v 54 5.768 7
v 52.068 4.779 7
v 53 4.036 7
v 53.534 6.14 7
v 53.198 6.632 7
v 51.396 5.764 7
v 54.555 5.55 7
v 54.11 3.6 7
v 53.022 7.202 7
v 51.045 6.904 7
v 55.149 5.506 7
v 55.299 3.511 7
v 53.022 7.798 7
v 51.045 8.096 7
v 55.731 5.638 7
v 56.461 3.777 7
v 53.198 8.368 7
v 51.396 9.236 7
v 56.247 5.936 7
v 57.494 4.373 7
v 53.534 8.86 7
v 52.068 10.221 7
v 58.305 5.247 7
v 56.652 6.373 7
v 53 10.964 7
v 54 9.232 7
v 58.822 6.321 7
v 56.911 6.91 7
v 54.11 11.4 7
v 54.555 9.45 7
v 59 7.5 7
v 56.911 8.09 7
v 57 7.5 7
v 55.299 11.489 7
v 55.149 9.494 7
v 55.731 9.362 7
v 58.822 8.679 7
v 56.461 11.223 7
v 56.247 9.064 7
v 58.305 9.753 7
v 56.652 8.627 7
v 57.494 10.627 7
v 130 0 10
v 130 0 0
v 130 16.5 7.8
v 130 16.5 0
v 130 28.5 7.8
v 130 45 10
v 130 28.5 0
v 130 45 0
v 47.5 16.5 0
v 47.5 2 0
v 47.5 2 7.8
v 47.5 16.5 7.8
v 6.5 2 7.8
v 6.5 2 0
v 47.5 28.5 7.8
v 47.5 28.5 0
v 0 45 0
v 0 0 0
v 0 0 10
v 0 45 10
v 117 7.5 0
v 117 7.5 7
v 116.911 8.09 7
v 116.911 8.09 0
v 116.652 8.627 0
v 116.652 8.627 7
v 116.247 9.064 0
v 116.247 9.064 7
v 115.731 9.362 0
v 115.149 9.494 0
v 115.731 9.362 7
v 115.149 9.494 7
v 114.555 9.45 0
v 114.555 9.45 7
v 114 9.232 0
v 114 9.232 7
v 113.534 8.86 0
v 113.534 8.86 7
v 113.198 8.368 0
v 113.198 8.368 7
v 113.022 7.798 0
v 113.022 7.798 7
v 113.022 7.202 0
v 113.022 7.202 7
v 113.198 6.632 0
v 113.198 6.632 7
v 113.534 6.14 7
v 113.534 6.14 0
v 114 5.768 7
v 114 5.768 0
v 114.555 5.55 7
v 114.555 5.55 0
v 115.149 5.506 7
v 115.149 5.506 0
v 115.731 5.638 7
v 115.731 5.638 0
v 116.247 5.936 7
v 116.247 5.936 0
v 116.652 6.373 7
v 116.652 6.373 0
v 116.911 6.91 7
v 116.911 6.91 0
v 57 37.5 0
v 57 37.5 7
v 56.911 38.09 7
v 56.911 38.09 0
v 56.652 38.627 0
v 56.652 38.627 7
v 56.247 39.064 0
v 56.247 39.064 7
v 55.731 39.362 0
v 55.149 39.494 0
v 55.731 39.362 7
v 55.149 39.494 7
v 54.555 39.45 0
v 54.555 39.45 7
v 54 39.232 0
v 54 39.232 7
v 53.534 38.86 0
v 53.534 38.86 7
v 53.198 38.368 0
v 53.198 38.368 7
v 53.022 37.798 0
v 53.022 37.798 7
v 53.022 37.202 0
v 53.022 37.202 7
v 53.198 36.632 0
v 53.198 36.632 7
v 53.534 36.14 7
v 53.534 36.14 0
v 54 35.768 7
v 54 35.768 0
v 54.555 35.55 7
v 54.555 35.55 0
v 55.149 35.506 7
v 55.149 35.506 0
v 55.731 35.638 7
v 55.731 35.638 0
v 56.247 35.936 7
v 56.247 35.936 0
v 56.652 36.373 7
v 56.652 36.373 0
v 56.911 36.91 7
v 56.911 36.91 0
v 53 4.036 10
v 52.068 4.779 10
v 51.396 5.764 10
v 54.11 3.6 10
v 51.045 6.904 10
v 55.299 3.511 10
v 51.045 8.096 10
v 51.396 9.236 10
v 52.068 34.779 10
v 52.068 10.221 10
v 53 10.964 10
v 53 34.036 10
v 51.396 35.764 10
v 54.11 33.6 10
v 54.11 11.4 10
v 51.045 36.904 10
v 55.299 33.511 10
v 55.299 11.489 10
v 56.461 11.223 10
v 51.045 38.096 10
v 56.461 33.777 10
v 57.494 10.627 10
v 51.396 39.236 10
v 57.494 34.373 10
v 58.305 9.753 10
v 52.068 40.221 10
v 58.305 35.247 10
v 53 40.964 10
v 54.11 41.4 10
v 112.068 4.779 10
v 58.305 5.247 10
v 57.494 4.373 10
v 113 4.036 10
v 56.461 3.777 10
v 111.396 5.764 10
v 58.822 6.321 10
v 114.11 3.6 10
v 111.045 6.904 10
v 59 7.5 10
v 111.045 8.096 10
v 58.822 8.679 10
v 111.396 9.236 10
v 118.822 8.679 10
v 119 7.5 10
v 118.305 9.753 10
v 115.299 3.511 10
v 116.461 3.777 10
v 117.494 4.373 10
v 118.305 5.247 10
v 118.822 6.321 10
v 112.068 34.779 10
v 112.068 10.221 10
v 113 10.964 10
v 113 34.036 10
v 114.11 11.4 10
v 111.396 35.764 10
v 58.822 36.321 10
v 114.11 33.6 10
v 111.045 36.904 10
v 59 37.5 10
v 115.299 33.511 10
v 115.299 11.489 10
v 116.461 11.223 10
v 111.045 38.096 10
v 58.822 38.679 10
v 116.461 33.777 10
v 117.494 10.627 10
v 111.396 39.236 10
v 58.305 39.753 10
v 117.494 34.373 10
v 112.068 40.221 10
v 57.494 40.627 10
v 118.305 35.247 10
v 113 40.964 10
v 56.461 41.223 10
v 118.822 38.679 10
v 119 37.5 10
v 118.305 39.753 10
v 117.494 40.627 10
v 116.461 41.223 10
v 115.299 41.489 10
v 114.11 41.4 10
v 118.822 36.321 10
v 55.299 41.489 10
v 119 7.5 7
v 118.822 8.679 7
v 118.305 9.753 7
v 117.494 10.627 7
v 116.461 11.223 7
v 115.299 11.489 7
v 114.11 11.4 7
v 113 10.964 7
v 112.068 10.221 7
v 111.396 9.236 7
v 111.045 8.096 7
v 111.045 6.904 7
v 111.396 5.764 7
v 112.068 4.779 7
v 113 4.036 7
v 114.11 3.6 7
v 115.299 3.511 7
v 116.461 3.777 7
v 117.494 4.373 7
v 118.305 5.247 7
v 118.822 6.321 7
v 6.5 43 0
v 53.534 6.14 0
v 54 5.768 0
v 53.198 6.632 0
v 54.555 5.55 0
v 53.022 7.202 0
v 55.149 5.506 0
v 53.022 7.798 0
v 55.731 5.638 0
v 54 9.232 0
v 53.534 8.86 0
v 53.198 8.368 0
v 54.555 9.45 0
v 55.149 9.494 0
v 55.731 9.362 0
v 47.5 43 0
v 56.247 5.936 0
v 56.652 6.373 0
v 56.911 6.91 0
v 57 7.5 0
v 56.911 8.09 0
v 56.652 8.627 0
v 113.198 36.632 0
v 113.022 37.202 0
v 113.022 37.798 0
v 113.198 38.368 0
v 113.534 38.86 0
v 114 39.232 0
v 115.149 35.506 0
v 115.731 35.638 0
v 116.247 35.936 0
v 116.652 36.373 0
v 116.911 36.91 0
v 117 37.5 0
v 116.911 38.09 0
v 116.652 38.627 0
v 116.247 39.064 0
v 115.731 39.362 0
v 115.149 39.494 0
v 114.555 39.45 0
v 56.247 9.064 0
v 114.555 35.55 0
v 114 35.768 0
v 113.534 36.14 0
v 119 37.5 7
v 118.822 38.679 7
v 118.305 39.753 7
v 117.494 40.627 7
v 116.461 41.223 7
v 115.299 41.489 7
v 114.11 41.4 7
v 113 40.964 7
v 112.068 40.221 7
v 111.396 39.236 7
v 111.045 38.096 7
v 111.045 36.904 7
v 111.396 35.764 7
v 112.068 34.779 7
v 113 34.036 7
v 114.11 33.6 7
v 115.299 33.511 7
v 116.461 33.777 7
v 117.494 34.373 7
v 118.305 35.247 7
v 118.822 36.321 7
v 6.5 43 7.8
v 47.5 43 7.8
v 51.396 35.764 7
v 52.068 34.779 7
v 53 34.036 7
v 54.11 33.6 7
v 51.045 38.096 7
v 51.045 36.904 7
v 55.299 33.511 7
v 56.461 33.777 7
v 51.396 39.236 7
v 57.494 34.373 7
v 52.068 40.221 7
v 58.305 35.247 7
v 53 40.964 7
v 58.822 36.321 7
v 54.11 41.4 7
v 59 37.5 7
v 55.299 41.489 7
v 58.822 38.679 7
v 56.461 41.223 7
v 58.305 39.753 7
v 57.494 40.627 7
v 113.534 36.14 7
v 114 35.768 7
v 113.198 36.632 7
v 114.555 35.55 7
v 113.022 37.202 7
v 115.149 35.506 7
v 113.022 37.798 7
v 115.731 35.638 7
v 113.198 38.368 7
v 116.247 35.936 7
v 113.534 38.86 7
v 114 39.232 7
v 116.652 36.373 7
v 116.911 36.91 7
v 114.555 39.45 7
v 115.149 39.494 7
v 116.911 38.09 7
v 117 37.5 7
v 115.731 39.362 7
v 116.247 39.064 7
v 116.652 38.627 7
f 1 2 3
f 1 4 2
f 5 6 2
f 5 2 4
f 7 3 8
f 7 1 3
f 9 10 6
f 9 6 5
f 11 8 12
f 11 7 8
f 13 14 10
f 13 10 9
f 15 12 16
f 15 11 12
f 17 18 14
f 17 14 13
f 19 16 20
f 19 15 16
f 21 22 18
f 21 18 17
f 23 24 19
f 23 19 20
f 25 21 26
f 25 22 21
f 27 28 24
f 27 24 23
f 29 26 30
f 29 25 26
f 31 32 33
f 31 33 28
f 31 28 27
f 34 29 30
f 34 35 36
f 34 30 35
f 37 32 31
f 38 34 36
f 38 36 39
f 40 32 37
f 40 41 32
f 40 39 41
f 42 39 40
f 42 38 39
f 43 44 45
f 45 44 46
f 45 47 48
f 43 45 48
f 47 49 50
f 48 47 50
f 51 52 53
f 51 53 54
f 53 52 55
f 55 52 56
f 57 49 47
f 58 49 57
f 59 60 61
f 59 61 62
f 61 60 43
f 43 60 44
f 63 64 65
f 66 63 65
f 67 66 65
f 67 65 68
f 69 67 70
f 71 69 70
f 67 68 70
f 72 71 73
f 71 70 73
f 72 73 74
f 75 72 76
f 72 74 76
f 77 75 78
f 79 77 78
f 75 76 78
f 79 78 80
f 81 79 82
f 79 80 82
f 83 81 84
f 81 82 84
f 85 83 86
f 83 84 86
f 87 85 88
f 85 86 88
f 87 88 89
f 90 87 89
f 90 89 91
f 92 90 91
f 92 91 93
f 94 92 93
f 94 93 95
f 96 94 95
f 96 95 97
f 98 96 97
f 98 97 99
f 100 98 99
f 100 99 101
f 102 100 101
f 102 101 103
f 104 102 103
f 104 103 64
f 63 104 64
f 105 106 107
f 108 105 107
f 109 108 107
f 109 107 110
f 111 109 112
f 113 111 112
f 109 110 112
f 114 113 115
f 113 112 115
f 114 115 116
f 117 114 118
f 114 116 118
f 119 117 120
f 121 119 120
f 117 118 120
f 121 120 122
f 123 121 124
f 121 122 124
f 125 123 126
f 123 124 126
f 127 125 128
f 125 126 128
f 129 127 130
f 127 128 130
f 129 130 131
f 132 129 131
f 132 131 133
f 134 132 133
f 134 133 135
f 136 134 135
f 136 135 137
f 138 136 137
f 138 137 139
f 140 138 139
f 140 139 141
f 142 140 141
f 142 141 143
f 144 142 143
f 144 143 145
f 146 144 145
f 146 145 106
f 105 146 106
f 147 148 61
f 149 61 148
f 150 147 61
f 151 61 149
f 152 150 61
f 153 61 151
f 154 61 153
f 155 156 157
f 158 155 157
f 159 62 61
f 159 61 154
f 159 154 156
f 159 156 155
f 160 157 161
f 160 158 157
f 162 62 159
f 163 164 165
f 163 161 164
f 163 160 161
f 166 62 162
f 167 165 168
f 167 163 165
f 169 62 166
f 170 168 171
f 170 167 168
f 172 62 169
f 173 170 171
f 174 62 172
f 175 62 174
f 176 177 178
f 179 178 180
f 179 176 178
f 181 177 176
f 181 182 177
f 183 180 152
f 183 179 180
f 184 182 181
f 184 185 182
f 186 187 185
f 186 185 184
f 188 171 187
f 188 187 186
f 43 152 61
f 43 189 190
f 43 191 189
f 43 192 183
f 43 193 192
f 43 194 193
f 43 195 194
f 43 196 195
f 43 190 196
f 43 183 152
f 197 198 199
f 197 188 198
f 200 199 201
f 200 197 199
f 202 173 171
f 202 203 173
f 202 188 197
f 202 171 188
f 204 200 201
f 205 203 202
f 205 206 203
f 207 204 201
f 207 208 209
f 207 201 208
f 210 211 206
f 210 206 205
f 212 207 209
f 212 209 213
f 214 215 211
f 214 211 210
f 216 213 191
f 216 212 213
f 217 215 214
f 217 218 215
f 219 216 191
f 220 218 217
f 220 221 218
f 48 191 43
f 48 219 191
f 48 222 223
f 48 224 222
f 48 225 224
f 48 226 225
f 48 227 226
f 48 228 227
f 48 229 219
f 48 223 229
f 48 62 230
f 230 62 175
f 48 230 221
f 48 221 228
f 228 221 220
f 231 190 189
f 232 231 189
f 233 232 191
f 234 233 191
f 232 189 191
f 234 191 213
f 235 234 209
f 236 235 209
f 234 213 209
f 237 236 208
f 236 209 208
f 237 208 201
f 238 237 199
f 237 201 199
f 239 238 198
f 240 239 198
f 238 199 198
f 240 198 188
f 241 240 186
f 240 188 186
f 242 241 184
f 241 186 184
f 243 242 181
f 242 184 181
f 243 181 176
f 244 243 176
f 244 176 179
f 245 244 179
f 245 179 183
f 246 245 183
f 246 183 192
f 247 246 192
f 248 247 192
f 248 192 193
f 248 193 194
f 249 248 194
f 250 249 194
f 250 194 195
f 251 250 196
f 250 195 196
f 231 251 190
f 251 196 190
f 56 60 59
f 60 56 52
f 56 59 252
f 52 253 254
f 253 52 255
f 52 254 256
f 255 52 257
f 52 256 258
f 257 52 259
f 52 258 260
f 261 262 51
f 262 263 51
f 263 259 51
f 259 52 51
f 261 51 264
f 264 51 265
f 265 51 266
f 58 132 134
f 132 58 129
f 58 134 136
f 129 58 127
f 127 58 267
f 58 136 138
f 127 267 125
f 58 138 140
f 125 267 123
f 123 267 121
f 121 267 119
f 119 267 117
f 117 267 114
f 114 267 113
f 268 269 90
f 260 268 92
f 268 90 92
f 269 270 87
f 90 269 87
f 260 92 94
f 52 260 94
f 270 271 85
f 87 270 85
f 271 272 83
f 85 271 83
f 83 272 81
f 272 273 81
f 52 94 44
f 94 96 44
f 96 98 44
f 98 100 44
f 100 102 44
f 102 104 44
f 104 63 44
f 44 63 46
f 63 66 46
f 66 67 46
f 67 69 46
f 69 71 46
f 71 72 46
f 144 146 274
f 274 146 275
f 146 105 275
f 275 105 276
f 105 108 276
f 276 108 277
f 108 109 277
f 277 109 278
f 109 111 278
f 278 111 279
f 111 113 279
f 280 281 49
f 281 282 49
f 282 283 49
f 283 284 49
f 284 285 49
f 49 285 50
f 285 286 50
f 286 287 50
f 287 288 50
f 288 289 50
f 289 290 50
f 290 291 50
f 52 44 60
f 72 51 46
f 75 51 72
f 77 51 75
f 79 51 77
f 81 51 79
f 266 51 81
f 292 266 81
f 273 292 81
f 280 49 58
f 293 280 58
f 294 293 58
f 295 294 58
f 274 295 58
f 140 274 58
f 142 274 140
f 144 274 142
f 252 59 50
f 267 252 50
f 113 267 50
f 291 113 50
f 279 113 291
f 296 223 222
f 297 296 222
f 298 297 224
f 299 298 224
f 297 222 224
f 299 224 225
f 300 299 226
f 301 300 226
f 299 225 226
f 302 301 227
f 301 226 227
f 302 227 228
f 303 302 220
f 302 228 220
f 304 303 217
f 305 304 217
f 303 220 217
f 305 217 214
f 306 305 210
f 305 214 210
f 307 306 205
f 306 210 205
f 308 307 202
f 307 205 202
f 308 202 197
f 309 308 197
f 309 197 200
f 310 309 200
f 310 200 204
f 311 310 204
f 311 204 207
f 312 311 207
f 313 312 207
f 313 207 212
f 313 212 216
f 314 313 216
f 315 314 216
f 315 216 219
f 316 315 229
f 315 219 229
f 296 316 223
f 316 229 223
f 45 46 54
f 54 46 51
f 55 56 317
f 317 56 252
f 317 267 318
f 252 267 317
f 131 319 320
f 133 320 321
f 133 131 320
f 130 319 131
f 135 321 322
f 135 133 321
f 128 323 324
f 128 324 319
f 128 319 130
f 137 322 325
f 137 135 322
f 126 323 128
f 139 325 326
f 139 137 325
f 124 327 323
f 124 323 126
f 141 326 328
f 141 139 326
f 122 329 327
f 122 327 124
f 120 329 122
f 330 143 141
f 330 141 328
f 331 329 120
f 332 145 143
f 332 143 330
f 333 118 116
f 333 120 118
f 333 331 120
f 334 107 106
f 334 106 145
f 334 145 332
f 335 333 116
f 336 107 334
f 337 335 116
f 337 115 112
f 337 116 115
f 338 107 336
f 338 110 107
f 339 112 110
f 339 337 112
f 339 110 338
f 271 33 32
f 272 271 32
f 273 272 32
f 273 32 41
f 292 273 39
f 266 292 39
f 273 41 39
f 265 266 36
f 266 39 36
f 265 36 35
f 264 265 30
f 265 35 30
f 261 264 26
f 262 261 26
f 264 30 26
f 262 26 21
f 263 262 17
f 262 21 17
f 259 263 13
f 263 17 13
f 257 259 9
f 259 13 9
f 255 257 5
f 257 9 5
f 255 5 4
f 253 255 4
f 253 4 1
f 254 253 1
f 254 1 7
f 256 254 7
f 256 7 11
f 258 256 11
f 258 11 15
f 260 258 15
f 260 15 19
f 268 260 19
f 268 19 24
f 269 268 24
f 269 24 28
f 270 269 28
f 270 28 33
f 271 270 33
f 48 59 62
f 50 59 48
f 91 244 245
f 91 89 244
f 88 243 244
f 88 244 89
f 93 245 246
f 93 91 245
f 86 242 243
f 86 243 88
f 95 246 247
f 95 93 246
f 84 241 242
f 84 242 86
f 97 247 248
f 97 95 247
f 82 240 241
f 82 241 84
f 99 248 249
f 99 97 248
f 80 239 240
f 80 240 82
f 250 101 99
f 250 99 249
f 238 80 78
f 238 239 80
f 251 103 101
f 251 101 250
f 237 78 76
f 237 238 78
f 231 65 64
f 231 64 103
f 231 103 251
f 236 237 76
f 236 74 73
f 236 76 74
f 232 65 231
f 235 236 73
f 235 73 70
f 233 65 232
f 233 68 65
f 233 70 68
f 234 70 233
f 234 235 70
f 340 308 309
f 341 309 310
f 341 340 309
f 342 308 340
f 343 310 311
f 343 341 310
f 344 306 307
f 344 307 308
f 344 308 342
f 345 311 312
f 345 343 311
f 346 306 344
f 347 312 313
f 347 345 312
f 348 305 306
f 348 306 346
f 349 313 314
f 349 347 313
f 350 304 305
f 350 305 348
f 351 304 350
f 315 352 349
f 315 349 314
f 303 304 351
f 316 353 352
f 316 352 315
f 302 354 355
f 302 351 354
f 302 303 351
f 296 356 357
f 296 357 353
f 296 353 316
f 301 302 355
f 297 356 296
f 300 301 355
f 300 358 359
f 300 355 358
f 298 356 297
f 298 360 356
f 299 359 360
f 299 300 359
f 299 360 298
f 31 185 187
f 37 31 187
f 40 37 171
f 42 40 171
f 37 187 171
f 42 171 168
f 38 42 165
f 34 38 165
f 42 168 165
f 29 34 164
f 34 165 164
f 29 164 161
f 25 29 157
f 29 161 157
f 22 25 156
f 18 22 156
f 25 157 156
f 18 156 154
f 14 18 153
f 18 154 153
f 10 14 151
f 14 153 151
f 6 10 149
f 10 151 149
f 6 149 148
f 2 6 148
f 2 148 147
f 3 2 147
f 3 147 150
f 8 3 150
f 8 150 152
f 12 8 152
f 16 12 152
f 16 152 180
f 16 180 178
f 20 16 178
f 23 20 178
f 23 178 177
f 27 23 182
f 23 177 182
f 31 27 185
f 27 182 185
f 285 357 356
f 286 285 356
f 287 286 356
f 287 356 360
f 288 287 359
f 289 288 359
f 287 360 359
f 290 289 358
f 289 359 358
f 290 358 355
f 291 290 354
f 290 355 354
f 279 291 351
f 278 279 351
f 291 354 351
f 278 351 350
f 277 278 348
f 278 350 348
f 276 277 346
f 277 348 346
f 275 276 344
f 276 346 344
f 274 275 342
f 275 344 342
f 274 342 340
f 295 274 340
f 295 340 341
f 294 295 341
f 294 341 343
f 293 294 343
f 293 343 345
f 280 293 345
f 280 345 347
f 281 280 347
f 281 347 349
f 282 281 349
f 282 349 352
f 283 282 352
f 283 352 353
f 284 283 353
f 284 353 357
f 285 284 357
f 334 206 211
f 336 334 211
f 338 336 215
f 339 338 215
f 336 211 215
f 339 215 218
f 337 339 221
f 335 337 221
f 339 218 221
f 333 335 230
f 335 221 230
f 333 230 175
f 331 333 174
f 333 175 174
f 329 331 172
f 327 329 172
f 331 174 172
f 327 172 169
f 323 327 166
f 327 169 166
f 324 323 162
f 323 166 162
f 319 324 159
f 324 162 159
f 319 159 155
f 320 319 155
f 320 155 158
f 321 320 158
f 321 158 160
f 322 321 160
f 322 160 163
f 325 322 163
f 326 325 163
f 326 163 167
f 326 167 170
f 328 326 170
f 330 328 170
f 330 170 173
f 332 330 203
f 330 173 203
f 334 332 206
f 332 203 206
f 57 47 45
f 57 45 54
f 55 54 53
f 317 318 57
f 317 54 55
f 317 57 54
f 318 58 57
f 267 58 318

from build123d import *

# Parameters (mm, degrees)
SKETCH1_W           = 130
SKETCH1_H           = 45
BOSS_EXTRUDE1_DEPTH = 10
SKETCH2_W           = 110
SKETCH2_H           = 12
CUT_EXTRUDE1_DEPTH  = 7.8
SKETCH4_R           = 2
CUT_EXTRUDE3_DEPTH  = 11
SKETCH5_R           = 4
CUT_EXTRUDE4_DEPTH  = 3
SKETCH6_W           = 41
SKETCH6_H           = 41
CUT_EXTRUDE5_DEPTH  = 7.8


with BuildPart() as part:
    # Sketch1 → Boss-Extrude1 (new body)
    with BuildSketch(Plane.XY):
        with Locations((65, 22.5)):
            Rectangle(SKETCH1_W, SKETCH1_H)
    extrude(amount=BOSS_EXTRUDE1_DEPTH)

    # Sketch2 → Cut-Extrude1 (cut)
    with BuildSketch(Plane(origin=(0, 0, 0), x_dir=(-1, 0, 0), z_dir=(0, 0, -1))):
        with Locations((-75, 22.5)):
            Rectangle(SKETCH2_W, SKETCH2_H)
    extrude(amount=-CUT_EXTRUDE1_DEPTH, mode=Mode.SUBTRACT)

    # Sketch4 → Cut-Extrude3 (cut, through all)
    with BuildSketch(Plane.XY.offset(10)):
        with Locations((55, 37.5)):
            Circle(SKETCH4_R)
        with Locations((115, 37.5)):
            Circle(SKETCH4_R)
        with Locations((115, 7.5)):
            Circle(SKETCH4_R)
        with Locations((55, 7.5)):
            Circle(SKETCH4_R)
    extrude(amount=-CUT_EXTRUDE3_DEPTH, mode=Mode.SUBTRACT)

    # Sketch5 → Cut-Extrude4 (cut)
    with BuildSketch(Plane.XY.offset(10)):
        with Locations((55, 37.5)):
            Circle(SKETCH5_R)
        with Locations((115, 37.5)):
            Circle(SKETCH5_R)
        with Locations((115, 7.5)):
            Circle(SKETCH5_R)
        with Locations((55, 7.5)):
            Circle(SKETCH5_R)
    extrude(amount=-CUT_EXTRUDE4_DEPTH, mode=Mode.SUBTRACT)

    # Sketch6 → Cut-Extrude5 (cut)
    with BuildSketch(Plane(origin=(0, 0, 0), x_dir=(-1, 0, 0), z_dir=(0, 0, -1))):
        with Locations((-27, 22.5)):
            Rectangle(SKETCH6_W, SKETCH6_H)
    extrude(amount=-CUT_EXTRUDE5_DEPTH, mode=Mode.SUBTRACT)


solid = part.part
